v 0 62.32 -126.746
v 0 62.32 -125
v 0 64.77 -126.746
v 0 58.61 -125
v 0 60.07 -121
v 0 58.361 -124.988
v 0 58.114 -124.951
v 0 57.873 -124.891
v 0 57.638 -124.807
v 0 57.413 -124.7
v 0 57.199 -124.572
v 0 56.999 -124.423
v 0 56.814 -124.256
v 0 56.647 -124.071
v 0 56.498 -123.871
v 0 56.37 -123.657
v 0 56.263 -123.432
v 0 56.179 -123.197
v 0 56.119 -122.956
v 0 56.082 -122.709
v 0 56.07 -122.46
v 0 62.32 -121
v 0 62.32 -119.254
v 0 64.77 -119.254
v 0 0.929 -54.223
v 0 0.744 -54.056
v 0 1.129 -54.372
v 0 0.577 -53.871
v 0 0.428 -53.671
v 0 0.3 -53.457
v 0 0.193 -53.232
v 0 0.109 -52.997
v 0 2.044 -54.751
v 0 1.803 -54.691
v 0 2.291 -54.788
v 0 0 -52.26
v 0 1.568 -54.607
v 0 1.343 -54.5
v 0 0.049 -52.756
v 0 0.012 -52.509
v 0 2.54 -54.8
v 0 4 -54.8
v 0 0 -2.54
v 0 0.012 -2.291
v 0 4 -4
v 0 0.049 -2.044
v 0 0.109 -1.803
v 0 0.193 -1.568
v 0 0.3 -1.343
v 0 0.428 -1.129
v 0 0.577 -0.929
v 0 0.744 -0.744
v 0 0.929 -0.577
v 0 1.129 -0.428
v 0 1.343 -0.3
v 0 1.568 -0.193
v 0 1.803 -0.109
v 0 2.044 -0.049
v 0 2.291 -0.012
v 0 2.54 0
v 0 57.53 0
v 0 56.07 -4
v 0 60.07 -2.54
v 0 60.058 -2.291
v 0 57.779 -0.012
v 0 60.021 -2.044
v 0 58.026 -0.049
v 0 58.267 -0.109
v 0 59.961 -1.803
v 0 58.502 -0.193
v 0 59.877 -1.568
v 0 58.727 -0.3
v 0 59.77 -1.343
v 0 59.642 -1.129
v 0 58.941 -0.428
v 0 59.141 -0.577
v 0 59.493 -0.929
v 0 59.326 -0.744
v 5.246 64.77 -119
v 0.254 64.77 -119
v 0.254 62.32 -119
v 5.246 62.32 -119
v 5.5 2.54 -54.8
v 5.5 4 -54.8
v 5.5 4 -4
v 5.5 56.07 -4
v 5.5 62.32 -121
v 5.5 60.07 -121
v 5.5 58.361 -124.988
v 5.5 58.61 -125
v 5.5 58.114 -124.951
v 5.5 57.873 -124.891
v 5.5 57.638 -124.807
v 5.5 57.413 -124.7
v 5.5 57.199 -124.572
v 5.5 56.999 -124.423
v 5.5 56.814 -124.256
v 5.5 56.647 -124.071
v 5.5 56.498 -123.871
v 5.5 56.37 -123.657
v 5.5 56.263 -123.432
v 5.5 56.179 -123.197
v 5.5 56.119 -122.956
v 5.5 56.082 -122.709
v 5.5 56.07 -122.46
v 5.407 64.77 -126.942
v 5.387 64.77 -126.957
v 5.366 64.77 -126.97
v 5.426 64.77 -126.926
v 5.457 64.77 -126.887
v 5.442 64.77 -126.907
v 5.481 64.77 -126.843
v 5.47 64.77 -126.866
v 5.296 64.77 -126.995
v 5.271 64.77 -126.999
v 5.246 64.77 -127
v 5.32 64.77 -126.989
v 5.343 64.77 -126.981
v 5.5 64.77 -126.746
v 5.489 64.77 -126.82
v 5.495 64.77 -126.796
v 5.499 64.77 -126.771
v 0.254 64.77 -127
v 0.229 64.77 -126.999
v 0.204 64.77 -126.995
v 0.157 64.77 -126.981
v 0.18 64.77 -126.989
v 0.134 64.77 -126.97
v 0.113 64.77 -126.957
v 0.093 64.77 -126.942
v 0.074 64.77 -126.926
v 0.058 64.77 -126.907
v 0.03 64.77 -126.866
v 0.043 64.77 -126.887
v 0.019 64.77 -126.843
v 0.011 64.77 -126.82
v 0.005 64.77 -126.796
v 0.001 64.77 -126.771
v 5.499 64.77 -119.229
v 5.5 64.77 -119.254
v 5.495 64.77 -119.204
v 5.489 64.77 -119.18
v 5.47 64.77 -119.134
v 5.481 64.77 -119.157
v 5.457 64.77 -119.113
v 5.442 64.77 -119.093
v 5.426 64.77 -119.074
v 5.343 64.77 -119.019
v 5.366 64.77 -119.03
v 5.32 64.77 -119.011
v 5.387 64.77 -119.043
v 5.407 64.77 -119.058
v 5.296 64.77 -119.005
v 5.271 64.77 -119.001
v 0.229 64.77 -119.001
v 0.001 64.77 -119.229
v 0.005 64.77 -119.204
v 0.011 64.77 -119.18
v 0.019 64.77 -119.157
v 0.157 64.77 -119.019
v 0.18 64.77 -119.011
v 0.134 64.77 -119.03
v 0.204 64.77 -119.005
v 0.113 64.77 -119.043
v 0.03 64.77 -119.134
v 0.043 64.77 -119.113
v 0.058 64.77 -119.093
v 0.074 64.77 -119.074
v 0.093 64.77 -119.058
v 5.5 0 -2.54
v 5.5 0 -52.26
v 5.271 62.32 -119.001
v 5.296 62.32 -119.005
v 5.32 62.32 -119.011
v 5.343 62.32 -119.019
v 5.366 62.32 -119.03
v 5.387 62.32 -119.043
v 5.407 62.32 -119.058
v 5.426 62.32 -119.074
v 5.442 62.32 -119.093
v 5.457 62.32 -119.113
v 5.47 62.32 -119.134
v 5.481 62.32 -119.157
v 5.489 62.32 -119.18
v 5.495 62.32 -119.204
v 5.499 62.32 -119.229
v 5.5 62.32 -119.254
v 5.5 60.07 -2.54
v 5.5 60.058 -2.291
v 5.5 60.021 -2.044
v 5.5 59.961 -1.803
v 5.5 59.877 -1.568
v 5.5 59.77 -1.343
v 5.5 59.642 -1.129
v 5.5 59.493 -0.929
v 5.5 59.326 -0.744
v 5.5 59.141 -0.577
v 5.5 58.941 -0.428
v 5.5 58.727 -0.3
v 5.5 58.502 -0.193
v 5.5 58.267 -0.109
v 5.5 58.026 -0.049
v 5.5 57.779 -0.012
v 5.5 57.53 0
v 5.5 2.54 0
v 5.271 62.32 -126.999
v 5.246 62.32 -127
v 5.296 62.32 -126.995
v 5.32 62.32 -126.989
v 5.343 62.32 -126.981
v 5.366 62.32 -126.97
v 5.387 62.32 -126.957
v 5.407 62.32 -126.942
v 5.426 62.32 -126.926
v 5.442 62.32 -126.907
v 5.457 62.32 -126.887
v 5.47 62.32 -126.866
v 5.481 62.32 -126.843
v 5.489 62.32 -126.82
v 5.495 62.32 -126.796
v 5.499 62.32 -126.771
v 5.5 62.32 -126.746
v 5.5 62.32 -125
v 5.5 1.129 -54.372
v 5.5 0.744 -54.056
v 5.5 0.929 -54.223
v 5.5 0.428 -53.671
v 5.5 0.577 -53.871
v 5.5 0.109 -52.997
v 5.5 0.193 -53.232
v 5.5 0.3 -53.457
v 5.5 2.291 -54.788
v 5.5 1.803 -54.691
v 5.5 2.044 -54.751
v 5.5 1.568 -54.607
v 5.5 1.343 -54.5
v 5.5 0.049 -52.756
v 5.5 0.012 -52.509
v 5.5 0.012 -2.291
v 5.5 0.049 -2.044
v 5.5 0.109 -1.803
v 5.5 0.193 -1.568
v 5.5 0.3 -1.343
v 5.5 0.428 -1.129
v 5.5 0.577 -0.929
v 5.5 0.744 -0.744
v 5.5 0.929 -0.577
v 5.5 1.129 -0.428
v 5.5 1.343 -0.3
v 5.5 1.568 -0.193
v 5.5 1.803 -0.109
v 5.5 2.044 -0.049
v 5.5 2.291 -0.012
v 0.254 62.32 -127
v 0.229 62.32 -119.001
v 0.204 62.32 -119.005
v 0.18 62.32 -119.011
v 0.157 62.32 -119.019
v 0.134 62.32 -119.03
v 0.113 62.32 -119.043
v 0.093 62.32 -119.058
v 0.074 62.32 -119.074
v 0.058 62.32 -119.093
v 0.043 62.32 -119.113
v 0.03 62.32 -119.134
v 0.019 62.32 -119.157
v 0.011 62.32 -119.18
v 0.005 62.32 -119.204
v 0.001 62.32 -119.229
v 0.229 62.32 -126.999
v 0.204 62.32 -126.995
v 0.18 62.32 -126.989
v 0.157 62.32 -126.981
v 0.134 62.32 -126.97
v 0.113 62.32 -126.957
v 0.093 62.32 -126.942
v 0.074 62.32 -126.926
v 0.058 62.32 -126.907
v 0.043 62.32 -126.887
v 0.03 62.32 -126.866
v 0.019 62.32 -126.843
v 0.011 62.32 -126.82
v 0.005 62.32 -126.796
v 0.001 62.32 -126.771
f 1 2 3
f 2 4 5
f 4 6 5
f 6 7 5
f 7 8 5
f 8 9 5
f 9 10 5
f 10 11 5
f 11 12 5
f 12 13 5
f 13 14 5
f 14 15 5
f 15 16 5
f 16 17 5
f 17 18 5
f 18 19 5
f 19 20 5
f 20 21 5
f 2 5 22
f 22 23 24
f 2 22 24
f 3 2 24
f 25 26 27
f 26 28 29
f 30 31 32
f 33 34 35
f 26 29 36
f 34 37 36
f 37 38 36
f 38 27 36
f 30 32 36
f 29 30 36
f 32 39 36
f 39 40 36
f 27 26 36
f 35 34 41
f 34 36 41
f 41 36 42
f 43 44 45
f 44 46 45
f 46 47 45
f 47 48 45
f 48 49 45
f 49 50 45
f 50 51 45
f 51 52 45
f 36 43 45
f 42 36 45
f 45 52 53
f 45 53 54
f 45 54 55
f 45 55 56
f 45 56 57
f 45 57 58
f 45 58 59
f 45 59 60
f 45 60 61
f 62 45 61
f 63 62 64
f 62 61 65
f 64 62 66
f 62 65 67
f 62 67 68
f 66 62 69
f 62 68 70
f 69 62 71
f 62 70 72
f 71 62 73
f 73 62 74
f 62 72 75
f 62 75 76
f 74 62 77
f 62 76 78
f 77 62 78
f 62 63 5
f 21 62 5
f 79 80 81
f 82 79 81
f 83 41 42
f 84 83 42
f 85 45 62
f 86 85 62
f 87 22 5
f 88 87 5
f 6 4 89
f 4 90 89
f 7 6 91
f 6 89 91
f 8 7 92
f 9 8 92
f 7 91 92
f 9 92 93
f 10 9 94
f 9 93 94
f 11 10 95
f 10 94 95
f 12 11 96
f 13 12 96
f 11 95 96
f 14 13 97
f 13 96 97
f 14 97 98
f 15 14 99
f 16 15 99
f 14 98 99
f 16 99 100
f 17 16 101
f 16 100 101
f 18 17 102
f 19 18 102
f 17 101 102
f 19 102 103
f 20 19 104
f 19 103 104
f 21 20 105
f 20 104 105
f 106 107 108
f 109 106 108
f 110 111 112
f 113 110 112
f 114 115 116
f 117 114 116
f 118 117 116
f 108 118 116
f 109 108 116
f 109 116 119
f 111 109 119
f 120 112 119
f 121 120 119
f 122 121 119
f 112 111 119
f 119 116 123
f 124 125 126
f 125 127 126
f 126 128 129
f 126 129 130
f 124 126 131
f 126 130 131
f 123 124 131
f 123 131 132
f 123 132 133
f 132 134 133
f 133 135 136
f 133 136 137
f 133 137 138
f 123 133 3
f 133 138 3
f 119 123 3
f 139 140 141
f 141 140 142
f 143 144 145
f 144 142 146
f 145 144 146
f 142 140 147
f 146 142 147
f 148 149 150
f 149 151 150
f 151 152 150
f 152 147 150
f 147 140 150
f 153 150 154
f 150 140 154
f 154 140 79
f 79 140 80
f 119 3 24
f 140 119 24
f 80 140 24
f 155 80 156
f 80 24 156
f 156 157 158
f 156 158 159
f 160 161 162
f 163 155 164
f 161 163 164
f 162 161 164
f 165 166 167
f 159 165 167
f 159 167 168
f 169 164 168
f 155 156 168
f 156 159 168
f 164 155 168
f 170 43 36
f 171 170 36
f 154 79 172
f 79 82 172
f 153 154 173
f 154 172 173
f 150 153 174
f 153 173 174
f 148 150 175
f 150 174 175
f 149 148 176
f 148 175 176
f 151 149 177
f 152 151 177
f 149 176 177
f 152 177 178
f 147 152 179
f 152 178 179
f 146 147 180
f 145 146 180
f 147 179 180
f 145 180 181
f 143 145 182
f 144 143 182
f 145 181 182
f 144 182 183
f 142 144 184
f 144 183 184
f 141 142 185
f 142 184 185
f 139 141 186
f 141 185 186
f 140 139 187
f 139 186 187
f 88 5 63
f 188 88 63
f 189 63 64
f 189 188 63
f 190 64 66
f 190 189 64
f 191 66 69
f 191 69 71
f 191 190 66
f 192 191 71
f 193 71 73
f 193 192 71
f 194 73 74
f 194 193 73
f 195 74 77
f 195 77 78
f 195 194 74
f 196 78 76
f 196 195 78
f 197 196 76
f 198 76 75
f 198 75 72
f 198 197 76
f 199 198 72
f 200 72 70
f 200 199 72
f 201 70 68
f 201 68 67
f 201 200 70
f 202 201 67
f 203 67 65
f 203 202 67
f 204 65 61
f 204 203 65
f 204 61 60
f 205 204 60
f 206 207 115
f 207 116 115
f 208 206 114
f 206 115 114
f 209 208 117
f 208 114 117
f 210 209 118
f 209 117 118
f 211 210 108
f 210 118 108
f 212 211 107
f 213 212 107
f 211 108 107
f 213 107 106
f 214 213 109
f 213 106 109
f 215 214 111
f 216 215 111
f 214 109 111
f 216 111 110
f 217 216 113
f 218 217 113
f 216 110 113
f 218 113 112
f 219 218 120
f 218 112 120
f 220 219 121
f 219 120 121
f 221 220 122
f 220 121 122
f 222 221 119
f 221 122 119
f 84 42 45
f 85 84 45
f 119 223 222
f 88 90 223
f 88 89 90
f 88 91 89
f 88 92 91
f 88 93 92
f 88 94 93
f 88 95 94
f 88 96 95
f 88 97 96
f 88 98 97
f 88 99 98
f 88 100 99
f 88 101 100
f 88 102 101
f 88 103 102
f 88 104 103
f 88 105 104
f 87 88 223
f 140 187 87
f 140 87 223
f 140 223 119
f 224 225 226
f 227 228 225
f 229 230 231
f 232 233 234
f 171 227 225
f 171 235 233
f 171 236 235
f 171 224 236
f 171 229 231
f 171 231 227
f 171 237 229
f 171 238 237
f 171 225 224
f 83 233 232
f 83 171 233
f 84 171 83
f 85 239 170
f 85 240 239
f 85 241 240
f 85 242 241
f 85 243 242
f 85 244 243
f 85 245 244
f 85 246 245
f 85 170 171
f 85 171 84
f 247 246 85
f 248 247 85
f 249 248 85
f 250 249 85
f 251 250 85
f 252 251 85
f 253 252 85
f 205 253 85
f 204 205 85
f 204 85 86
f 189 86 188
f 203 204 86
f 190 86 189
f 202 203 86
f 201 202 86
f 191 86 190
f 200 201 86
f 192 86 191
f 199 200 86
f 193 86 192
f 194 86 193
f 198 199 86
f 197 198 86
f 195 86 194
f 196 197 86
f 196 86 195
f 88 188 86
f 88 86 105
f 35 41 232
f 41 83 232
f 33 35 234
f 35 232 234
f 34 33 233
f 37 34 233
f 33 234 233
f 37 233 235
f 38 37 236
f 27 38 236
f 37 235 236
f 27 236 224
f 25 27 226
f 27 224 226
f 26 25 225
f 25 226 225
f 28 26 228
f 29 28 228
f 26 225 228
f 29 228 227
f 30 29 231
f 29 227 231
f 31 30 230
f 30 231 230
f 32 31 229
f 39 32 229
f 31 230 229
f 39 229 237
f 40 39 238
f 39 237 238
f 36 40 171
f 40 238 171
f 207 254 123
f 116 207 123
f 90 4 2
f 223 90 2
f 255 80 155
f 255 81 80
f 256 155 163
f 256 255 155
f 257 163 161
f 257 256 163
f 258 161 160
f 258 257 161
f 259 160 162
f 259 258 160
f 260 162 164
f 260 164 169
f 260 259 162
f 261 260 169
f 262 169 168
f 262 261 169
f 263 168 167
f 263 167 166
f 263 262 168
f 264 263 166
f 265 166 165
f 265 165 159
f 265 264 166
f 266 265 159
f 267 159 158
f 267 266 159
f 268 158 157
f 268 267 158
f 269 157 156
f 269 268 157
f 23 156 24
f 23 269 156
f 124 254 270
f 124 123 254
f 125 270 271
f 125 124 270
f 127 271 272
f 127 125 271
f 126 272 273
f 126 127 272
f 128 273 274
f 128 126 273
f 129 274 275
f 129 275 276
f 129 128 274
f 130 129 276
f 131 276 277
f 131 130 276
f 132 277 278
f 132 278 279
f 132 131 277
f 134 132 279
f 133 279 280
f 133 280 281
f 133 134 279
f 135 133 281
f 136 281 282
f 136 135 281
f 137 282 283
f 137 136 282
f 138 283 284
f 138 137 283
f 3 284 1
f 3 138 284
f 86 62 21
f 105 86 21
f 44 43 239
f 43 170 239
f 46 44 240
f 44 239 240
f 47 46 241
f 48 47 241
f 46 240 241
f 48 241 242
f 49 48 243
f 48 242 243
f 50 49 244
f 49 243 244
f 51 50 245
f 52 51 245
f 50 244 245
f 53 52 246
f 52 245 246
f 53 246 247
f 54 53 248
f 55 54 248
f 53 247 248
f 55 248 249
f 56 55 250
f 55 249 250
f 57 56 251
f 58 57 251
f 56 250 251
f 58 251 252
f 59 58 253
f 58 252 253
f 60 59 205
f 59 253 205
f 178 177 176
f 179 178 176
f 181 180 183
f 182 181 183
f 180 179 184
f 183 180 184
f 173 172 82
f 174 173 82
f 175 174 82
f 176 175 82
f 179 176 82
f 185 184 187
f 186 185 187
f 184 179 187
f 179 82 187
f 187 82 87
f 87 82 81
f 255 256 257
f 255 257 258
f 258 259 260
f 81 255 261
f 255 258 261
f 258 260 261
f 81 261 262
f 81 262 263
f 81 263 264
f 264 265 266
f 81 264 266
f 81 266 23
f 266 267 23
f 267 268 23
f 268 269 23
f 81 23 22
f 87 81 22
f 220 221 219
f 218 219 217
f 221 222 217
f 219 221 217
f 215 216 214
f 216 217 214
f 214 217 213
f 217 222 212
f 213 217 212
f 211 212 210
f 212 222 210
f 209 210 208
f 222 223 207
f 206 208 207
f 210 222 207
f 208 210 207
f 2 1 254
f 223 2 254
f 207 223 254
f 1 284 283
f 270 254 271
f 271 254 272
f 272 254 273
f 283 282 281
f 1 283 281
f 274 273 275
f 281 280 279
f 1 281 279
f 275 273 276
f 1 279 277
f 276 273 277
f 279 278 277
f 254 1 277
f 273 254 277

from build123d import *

# Parameters (mm, degrees)
F1_DEPTH = 5.5
F2_R     = 0.254
F3_R     = 2.54


with BuildPart() as f1:
    # F0 (on Right) → F1 (new body)
    with BuildSketch(Plane.YZ):
        Polygon((0, 0), (0, -29.4), (0, -54.8), (4, -54.8), (4, -4), (56.07, -4), (56.07, -125), (60.07, -125), (62.32, -125), (62.32, -127), (64.77, -127), (64.77, -119), (62.32, -119), (62.32, -121), (60.07, -121), (60.07, 0), align=None)
    extrude(amount=F1_DEPTH)

    # F2
    f2_edges = [f1.edges().sort_by_distance(p)[0] for p in [
        (5.5, 63.545, -119),
        (5.5, 63.545, -127),
        (0, 63.545, -119),
        (0, 63.545, -127),
    ]]
    fillet(f2_edges, radius=F2_R)

    # F3
    f3_edges = [f1.edges().sort_by_distance(p)[0] for p in [
        (2.75, 60.07, 0),
        (2.75, 0, 0),
        (2.75, 56.07, -125),
        (2.75, 0, -54.8),
    ]]
    fillet(f3_edges, radius=F3_R)


solid = f1.part
